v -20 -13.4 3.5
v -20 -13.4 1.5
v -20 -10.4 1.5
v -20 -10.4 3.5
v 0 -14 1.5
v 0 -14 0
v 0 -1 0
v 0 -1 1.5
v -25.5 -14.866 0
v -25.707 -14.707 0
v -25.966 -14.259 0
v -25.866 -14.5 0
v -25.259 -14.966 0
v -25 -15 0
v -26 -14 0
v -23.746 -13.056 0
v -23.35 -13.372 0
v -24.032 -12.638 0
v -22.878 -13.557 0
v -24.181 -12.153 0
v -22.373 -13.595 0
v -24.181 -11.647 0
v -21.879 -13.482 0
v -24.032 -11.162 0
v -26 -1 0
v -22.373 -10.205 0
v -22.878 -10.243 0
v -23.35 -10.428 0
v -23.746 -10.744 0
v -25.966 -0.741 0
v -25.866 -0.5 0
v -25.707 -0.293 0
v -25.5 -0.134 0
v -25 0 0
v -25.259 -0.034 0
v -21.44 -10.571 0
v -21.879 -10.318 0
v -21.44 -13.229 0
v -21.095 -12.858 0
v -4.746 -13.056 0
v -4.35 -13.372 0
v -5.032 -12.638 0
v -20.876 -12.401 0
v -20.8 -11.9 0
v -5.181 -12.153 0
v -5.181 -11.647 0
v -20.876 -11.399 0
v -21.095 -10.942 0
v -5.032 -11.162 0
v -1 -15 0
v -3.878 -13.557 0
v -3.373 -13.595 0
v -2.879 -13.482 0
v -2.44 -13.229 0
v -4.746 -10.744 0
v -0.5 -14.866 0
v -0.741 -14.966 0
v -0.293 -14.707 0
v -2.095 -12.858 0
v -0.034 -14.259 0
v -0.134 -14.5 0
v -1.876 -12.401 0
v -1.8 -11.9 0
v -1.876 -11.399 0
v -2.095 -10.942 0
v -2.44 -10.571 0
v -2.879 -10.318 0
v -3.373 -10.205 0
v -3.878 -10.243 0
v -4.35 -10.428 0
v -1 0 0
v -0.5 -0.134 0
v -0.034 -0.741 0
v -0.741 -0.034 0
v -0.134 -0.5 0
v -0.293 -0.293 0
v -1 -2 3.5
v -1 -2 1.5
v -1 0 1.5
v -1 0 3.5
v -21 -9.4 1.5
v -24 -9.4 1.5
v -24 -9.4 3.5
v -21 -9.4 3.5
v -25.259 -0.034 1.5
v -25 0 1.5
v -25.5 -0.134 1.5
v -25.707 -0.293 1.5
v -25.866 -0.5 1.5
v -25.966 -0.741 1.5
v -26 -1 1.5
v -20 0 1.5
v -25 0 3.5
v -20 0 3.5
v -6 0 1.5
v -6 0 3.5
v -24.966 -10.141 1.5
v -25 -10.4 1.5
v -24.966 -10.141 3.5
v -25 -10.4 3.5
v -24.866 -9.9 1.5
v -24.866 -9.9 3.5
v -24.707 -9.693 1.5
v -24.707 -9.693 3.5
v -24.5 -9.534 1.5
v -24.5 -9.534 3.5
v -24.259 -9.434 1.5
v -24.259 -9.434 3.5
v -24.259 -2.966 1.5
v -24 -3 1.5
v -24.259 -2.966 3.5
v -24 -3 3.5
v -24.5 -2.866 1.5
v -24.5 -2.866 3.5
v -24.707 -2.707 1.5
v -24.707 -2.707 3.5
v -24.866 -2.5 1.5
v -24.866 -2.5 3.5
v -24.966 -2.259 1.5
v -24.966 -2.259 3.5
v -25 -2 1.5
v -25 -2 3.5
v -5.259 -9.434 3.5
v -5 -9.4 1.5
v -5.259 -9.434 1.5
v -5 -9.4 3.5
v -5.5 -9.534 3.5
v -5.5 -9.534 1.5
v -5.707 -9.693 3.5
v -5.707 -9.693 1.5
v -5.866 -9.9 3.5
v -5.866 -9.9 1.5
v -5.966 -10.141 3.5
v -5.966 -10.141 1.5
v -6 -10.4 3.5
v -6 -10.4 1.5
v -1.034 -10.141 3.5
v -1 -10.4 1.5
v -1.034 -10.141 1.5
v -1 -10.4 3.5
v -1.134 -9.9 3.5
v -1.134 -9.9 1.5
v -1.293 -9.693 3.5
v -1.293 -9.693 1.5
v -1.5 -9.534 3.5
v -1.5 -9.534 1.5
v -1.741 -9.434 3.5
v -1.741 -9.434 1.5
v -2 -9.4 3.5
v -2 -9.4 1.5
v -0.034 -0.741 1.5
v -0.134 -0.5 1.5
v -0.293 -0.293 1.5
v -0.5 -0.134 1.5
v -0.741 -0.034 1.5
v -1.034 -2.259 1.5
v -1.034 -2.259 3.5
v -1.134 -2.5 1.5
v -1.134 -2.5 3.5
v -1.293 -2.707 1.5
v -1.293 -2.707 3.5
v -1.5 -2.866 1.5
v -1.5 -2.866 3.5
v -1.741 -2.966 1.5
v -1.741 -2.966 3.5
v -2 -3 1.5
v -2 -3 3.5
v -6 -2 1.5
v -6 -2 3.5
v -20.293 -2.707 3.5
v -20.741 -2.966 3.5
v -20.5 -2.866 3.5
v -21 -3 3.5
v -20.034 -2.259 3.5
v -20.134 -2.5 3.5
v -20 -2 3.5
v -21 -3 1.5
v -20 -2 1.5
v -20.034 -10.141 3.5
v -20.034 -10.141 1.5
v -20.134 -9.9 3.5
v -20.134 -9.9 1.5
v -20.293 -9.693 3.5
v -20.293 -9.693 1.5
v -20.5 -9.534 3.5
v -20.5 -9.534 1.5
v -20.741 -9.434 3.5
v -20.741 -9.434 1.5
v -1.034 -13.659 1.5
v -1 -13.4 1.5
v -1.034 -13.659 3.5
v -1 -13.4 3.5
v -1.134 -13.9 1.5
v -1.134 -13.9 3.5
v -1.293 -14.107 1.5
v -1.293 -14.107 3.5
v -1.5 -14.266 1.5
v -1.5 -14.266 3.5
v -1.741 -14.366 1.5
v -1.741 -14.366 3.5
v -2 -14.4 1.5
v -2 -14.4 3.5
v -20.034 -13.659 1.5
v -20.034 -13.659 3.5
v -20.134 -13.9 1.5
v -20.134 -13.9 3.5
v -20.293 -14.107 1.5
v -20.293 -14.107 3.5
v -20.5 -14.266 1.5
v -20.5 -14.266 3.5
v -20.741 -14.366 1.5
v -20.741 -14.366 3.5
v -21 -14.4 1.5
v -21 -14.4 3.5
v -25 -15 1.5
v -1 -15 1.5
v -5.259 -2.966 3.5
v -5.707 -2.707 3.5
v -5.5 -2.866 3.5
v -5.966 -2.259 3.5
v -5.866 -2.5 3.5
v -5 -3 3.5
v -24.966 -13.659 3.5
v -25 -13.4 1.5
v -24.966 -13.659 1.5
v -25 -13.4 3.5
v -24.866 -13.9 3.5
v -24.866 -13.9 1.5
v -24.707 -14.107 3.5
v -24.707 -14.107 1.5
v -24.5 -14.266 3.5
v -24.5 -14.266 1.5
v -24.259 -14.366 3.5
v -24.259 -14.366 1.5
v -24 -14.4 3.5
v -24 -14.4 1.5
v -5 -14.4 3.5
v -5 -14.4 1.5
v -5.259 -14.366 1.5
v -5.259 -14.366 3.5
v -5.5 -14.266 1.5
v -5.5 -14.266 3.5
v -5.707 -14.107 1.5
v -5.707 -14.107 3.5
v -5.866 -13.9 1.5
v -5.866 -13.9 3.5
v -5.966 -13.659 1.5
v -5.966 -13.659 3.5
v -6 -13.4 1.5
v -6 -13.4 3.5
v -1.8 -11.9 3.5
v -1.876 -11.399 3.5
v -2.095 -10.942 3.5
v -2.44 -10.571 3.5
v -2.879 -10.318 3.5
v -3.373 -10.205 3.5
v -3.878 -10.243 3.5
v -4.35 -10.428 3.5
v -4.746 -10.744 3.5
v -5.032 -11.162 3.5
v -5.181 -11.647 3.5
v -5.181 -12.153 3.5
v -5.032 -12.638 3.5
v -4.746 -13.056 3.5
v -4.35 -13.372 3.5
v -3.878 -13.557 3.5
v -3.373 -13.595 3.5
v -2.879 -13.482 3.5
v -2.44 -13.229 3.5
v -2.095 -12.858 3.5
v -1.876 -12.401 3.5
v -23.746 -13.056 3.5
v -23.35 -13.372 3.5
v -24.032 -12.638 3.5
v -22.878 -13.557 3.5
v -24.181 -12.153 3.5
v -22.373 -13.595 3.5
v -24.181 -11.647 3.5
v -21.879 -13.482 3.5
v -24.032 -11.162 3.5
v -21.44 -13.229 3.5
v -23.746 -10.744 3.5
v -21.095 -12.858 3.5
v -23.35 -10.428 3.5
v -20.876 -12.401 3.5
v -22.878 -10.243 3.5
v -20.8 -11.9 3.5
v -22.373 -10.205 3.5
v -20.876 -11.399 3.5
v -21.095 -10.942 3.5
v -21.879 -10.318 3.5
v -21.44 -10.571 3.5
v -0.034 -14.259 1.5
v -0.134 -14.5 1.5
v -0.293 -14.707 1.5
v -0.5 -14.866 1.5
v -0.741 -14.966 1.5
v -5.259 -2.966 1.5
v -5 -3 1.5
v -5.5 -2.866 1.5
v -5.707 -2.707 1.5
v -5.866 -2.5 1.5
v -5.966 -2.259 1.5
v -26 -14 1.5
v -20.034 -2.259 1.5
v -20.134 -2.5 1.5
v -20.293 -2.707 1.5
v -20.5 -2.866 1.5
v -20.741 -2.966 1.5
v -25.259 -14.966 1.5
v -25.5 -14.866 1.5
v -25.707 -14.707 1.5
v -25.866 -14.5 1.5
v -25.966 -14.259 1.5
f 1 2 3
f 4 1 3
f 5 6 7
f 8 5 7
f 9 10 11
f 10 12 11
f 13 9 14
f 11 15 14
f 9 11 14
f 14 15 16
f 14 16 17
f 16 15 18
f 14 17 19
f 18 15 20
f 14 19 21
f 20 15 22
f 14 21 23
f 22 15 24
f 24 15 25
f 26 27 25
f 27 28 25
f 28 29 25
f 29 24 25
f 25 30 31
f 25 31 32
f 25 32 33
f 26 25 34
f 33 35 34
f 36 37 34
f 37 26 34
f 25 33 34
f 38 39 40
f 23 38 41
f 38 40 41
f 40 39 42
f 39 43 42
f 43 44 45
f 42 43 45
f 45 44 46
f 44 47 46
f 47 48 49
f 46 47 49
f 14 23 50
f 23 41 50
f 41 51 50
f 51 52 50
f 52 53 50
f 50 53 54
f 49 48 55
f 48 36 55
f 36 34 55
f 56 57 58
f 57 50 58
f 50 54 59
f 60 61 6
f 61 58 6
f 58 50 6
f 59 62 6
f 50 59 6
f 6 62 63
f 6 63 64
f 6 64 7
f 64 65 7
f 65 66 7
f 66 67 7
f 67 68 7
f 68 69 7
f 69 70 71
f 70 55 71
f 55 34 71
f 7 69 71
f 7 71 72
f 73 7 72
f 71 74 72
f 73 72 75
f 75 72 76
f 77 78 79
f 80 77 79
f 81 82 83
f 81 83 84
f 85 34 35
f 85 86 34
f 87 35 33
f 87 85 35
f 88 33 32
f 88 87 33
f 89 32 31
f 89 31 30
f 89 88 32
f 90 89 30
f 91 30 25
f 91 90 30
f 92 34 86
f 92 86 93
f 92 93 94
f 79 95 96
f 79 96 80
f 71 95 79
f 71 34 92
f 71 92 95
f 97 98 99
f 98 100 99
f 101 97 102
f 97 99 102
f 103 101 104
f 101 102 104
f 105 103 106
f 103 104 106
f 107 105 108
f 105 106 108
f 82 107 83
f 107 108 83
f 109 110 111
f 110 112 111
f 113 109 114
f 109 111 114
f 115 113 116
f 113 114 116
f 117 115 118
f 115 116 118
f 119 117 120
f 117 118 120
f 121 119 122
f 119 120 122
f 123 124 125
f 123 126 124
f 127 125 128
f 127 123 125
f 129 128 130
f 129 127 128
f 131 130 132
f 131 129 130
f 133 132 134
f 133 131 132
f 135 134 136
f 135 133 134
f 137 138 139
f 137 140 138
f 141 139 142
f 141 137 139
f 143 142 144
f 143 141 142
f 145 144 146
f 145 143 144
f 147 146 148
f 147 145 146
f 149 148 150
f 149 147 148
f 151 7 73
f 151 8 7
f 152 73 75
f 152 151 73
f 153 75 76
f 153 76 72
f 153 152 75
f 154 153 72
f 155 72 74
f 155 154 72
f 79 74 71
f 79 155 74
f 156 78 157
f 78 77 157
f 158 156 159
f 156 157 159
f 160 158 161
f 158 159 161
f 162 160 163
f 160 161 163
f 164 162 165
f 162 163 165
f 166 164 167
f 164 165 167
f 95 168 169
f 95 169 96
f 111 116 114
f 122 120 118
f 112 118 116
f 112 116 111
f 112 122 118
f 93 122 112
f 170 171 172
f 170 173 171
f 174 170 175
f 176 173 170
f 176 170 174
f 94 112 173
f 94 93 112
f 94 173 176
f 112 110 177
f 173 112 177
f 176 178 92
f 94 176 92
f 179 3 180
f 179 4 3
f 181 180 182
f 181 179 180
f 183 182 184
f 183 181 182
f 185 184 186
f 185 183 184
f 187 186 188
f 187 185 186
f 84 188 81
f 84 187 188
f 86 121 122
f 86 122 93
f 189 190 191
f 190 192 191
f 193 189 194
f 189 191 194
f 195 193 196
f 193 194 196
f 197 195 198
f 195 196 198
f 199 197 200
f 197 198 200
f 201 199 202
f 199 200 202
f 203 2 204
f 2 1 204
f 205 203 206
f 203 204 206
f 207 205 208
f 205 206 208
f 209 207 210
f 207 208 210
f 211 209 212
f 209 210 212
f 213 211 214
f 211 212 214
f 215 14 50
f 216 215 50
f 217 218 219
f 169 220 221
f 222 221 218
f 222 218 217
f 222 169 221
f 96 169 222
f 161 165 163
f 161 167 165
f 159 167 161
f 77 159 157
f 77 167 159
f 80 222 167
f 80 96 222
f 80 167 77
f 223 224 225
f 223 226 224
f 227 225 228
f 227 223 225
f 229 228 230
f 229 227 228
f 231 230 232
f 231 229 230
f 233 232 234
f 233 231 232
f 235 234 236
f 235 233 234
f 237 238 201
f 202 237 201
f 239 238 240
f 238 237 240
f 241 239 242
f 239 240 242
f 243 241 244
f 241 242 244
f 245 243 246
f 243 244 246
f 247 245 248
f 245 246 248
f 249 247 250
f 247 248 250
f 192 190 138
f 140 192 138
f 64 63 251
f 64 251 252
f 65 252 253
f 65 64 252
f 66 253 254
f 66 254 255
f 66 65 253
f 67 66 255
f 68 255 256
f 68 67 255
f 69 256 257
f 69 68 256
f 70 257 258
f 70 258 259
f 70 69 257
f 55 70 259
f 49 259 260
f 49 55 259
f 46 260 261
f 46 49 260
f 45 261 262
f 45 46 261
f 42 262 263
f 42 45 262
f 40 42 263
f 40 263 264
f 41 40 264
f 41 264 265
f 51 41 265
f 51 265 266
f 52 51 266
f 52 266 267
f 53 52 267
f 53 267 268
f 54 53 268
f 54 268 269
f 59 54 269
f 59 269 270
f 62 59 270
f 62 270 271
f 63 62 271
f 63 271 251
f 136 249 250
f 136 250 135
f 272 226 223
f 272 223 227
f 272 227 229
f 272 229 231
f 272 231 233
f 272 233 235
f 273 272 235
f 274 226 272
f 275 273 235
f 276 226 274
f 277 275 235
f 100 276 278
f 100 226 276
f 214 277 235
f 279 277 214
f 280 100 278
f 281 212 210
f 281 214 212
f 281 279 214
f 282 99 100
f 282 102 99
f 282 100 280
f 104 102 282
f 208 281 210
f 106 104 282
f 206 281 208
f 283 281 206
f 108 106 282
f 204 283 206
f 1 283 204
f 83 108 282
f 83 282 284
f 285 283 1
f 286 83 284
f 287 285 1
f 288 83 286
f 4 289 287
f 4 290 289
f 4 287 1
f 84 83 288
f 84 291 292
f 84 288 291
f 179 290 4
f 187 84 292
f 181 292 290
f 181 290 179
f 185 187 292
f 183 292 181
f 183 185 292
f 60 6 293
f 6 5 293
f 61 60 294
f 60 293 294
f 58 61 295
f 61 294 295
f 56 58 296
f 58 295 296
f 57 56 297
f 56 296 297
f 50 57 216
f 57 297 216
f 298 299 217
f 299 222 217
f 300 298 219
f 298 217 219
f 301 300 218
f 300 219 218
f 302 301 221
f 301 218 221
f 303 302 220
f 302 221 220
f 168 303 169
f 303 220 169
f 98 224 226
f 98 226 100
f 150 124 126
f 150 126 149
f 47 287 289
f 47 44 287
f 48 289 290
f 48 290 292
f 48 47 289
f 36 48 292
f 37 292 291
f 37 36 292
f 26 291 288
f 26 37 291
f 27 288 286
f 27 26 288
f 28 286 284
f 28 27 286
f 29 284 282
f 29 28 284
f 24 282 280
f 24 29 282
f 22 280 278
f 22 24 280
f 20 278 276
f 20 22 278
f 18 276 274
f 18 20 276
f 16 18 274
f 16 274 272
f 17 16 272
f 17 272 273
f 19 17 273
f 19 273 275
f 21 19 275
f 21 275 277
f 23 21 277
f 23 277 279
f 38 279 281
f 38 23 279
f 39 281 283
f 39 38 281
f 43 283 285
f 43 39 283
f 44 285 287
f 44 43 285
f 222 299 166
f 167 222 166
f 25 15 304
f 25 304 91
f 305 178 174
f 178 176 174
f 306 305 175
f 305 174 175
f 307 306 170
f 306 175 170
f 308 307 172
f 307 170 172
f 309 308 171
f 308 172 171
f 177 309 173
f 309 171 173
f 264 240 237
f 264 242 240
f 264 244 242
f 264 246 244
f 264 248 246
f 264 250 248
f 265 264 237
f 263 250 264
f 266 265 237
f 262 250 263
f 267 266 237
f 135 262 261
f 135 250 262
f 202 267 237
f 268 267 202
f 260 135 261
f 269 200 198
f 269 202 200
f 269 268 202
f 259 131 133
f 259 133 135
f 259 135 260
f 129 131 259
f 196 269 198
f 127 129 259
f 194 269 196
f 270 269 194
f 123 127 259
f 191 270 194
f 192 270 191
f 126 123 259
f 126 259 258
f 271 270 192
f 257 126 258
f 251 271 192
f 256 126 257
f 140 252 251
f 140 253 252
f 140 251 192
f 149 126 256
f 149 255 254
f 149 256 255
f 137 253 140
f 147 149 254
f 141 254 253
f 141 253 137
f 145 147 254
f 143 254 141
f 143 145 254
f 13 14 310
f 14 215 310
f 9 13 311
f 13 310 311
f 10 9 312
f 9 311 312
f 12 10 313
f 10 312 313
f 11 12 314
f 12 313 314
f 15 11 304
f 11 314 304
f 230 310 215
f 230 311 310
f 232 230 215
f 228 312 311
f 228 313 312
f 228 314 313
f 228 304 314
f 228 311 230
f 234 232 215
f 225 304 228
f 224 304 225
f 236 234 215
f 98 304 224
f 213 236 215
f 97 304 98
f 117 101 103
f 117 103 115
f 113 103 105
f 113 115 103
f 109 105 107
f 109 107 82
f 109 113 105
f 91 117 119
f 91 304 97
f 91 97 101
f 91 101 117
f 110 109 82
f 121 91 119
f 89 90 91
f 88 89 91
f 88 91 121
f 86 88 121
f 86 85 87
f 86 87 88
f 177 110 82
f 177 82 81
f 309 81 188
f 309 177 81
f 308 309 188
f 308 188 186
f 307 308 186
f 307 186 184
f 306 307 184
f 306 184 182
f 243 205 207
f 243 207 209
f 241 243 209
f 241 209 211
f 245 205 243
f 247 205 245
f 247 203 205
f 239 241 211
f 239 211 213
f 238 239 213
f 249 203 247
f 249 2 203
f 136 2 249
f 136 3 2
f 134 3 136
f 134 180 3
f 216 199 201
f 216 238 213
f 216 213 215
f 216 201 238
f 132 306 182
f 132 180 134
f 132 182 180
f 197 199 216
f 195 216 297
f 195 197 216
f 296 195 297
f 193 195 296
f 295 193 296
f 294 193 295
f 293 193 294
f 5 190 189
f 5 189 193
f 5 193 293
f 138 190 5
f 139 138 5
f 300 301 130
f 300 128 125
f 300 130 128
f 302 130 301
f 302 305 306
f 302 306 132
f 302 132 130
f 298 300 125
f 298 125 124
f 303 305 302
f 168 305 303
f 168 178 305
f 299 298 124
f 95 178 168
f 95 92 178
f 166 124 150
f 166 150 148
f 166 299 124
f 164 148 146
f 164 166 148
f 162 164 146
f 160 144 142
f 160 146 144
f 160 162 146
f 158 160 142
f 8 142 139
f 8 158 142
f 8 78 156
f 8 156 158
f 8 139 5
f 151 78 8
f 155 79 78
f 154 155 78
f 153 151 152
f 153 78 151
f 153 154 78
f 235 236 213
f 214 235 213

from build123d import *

# Parameters (mm, degrees)
F0_W     = 26
F0_H     = 15
F0_R     = 1.7
F1_DEPTH = 1.5
F2_W     = 5
F2_H     = 5
F2_R     = 1.7
F2_H_2   = 3
F3_DEPTH = 2
F4_R     = 1


with BuildPart() as f1:
    # F0 (on Top) → F1 (new body)
    with BuildSketch(Plane.XY):
        with Locations((-13, -7.5)):
            Rectangle(F0_W, F0_H)
        with Locations((-22.5, -11.9)):
            Circle(F0_R, mode=Mode.SUBTRACT)
        with Locations((-3.5, -11.9)):
            Circle(F0_R, mode=Mode.SUBTRACT)
    extrude(amount=F1_DEPTH)

    # F2 (on face) → F3 (join)
    with BuildSketch(Plane.XY.offset(1.5)):
        with Locations((-22.5, -11.9)):
            Rectangle(F2_W, F2_H)
        with Locations((-22.5, -11.9)):
            Circle(F2_R, mode=Mode.SUBTRACT)
        with Locations((-3.5, -11.9)):
            Rectangle(F2_W, F2_H)
        with Locations((-3.5, -11.9)):
            Circle(F2_R, mode=Mode.SUBTRACT)
        with Locations((-22.5, -1.5)):
            Rectangle(F2_W, F2_H_2)
        with Locations((-3.5, -1.5)):
            Rectangle(F2_W, F2_H_2)
    extrude(amount=F3_DEPTH)

    # F4
    f4_edges = [f1.edges().sort_by_distance(p)[0] for p in [
        (-26, 0, 0.75),
        (-26, -15, 0.75),
        (0, -15, 0.75),
        (0, 0, 0.75),
        (-1, -3, 2.5),
        (-6, -3, 2.5),
        (-20, -3, 2.5),
        (-25, -3, 2.5),
        (-25, -14.4, 2.5),
        (-25, -9.4, 2.5),
        (-20, -9.4, 2.5),
        (-20, -14.4, 2.5),
        (-6, -14.4, 2.5),
        (-1, -14.4, 2.5),
        (-1, -9.4, 2.5),
        (-6, -9.4, 2.5),
    ]]
    fillet(f4_edges, radius=F4_R)


solid = f1.part
